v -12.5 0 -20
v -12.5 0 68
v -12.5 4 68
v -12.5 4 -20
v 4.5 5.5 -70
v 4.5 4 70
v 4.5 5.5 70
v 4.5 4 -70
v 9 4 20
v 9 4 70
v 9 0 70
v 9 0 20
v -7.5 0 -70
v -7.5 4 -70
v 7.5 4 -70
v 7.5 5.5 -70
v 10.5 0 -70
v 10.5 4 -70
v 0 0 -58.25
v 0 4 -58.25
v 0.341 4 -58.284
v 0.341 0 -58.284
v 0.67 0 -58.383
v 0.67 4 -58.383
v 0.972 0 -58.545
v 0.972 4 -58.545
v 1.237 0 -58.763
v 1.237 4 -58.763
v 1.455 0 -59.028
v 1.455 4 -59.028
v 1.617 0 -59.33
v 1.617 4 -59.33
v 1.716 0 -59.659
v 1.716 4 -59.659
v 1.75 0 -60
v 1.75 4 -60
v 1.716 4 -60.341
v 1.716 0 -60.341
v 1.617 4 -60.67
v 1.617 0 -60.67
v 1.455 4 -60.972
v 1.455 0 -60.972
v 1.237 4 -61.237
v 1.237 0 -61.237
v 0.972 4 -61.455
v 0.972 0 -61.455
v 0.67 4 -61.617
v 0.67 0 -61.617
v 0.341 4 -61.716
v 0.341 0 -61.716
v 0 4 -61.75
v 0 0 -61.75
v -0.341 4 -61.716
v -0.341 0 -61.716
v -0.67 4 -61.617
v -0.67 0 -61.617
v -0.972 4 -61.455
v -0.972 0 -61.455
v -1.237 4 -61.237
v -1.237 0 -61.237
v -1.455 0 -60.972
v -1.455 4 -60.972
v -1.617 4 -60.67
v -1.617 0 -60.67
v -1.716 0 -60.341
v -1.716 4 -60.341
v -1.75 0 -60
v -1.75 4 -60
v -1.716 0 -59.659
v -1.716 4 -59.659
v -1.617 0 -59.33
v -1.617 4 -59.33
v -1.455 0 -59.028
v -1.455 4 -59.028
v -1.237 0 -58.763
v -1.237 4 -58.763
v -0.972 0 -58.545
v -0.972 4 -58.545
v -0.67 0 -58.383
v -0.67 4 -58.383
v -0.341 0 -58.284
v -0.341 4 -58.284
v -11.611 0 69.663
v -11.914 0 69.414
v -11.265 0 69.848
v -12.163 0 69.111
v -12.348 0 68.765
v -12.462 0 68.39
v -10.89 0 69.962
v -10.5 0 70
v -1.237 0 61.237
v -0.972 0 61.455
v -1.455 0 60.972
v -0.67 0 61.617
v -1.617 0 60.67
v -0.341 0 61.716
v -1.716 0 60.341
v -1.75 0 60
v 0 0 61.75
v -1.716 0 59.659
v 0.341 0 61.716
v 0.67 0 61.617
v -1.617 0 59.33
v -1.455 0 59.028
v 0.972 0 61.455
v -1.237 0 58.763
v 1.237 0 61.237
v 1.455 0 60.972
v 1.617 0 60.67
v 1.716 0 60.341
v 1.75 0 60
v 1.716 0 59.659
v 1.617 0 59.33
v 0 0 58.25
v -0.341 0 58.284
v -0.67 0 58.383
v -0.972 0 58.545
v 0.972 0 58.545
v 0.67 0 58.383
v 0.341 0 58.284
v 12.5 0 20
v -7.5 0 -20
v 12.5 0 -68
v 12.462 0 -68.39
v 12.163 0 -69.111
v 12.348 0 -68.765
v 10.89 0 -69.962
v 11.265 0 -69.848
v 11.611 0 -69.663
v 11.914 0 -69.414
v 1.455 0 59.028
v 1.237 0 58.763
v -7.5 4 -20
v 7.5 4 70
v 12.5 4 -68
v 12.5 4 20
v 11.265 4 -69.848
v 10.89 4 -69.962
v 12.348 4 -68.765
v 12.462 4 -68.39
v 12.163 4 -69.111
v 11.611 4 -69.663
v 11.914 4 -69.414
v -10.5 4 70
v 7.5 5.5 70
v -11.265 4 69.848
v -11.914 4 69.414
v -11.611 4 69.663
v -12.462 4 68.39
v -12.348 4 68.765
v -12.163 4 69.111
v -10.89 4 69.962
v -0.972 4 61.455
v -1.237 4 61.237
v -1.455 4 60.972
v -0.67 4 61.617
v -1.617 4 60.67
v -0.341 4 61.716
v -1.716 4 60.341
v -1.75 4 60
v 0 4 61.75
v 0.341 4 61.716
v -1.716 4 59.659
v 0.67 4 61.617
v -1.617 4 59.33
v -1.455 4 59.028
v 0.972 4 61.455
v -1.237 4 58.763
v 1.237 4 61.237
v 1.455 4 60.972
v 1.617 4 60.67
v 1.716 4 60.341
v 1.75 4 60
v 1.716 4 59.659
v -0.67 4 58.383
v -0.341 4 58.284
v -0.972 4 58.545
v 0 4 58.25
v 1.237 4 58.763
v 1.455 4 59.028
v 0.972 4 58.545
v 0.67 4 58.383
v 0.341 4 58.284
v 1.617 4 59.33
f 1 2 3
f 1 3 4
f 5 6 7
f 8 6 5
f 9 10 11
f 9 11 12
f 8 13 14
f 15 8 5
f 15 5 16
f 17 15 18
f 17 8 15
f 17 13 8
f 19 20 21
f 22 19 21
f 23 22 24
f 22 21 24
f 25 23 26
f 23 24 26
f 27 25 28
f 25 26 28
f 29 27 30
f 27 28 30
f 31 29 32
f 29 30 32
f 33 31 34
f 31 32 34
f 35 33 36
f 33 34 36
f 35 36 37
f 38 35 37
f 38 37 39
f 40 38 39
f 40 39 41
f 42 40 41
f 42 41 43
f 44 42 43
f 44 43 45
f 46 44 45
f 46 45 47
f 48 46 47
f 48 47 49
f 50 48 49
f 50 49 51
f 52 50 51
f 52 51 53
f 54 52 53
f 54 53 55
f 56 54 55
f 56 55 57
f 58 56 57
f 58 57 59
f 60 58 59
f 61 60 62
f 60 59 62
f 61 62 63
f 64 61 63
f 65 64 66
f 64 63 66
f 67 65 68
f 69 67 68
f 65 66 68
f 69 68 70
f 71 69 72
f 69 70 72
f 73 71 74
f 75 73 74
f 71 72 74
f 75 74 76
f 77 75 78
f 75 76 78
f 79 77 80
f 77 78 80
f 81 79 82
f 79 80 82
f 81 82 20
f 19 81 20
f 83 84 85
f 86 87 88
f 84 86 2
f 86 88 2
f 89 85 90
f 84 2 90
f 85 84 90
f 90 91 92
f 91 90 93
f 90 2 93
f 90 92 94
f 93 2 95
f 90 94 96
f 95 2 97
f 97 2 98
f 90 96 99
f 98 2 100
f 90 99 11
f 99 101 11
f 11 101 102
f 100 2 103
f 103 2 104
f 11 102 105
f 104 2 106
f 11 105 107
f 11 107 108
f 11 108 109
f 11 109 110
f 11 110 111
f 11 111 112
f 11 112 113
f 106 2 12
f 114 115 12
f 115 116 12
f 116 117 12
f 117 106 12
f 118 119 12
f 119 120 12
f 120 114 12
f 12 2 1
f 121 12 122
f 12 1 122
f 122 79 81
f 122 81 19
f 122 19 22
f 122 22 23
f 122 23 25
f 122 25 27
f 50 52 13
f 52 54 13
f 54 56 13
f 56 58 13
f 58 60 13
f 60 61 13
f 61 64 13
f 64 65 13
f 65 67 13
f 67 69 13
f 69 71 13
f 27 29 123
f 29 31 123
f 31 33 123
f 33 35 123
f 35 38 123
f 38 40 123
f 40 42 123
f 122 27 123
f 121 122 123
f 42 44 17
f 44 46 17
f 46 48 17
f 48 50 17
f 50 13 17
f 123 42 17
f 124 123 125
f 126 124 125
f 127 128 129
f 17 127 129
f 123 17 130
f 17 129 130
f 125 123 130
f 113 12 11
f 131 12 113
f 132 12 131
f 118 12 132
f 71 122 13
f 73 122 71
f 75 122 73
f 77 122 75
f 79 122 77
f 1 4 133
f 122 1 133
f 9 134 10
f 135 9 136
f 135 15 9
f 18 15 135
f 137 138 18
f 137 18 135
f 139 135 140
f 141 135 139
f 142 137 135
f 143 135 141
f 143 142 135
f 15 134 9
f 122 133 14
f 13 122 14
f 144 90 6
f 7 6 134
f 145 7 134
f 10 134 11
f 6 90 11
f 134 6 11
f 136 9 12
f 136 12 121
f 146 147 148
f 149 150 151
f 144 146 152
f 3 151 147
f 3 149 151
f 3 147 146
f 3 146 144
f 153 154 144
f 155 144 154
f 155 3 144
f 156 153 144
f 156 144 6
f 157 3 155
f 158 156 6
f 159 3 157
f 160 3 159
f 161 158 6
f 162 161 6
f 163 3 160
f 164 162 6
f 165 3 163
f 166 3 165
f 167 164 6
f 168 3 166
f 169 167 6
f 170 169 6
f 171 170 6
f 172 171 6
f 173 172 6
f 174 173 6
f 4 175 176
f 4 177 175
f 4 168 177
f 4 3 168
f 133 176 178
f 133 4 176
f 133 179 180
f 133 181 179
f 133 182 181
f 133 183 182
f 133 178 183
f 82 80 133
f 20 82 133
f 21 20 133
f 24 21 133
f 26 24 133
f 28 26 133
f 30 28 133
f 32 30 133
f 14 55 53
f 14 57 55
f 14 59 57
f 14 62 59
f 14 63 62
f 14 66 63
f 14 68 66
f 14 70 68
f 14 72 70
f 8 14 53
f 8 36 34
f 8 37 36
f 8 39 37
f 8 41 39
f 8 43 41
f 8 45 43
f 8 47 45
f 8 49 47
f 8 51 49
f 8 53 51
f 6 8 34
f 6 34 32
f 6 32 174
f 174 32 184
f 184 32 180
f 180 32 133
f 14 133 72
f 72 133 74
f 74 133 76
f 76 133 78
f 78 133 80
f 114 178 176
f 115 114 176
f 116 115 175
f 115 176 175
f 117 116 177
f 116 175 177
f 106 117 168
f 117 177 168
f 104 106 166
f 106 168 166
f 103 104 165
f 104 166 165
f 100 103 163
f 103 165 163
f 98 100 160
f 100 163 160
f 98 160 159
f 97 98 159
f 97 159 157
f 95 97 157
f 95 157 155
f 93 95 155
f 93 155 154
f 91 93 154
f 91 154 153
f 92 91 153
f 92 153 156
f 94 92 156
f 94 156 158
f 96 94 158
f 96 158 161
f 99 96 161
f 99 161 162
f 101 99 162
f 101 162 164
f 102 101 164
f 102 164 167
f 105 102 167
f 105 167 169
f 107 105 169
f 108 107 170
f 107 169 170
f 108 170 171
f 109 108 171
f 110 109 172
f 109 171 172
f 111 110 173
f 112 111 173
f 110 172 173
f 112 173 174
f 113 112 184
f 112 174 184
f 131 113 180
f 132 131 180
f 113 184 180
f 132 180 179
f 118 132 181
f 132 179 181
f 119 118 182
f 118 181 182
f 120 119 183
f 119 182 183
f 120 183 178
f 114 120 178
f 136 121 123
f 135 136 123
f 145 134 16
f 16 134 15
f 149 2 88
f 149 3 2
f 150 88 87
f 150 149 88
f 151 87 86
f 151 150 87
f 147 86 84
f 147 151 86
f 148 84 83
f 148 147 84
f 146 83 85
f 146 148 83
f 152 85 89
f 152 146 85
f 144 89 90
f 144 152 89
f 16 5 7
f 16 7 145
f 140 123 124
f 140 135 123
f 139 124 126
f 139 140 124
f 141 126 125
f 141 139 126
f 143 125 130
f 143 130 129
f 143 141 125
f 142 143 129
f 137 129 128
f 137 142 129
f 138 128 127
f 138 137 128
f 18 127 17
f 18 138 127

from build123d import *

# Parameters (mm, degrees)
SKETCH_1_W          = 25
SKETCH_1_H          = 140
EXTRUDE_1_DEPTH     = 4
FILLET_1_R          = 2
SKETCH_4_R          = 1.75
CUT_EXTRUDE_1_DEPTH = 10
SKETCH_6_W          = 3
SKETCH_6_H          = 140
EXTRUDE_3_DEPTH     = 1.5
SKETCH_7_W          = 20.611875048
SKETCH_7_H          = 50
CUT_EXTRUDE_2_DEPTH = 10
SKETCH_8_W          = 3.5
SKETCH_8_H          = 50
CUT_EXTRUDE_3_DEPTH = 45


with BuildPart() as part:
    # 草图1 → 凸台-拉伸1 (new body)
    with BuildSketch(Plane(origin=(0, 0, 0), x_dir=(1, 0, 0), z_dir=(0, 1, 0))):
        Rectangle(SKETCH_1_W, SKETCH_1_H)
    extrude(amount=EXTRUDE_1_DEPTH)

    # 圆角1
    fillet_1_edges = [part.edges().sort_by_distance(p)[0] for p in [
        (12.5, 2, 70),
        (-12.5, 2, 70),
        (-12.5, 2, -70),
        (12.5, 2, -70),
    ]]
    fillet(fillet_1_edges, radius=FILLET_1_R)

    # 草图4 → 切除-拉伸1 (cut)
    with BuildSketch(Plane(origin=(0, 4, 0), x_dir=(1, 0, 0), z_dir=(0, 1, 0))):
        with Locations(Location((0, 60, 0), (0, 0, 270))):
            Circle(SKETCH_4_R)
        with Locations(Location((0, -60, 0), (0, 0, 90))):
            Circle(SKETCH_4_R)
    extrude(amount=-CUT_EXTRUDE_1_DEPTH, mode=Mode.SUBTRACT)

    # 草图6 → 凸台-拉伸3 (add)
    with BuildSketch(Plane(origin=(0, 4, 0), x_dir=(1, 0, 0), z_dir=(0, 1, 0))):
        with Locations((6, 0)):
            Rectangle(SKETCH_6_W, SKETCH_6_H)
    extrude(amount=EXTRUDE_3_DEPTH)

    # 草图7 → 切除-拉伸2 (cut)
    with BuildSketch(Plane(origin=(0, 4, 0), x_dir=(1, 0, 0), z_dir=(0, 1, 0))):
        with Locations((-17.805937524, 45)):
            Rectangle(SKETCH_7_W, SKETCH_7_H)
    extrude(amount=-CUT_EXTRUDE_2_DEPTH, mode=Mode.SUBTRACT)

    # 草图8 → 切除-拉伸3 (cut)
    with BuildSketch(Plane(origin=(0, 4, 0), x_dir=(1, 0, 0), z_dir=(0, 1, 0))):
        with Locations((10.75, -45)):
            Rectangle(SKETCH_8_W, SKETCH_8_H)
    extrude(amount=-CUT_EXTRUDE_3_DEPTH, mode=Mode.SUBTRACT)


solid = part.part
